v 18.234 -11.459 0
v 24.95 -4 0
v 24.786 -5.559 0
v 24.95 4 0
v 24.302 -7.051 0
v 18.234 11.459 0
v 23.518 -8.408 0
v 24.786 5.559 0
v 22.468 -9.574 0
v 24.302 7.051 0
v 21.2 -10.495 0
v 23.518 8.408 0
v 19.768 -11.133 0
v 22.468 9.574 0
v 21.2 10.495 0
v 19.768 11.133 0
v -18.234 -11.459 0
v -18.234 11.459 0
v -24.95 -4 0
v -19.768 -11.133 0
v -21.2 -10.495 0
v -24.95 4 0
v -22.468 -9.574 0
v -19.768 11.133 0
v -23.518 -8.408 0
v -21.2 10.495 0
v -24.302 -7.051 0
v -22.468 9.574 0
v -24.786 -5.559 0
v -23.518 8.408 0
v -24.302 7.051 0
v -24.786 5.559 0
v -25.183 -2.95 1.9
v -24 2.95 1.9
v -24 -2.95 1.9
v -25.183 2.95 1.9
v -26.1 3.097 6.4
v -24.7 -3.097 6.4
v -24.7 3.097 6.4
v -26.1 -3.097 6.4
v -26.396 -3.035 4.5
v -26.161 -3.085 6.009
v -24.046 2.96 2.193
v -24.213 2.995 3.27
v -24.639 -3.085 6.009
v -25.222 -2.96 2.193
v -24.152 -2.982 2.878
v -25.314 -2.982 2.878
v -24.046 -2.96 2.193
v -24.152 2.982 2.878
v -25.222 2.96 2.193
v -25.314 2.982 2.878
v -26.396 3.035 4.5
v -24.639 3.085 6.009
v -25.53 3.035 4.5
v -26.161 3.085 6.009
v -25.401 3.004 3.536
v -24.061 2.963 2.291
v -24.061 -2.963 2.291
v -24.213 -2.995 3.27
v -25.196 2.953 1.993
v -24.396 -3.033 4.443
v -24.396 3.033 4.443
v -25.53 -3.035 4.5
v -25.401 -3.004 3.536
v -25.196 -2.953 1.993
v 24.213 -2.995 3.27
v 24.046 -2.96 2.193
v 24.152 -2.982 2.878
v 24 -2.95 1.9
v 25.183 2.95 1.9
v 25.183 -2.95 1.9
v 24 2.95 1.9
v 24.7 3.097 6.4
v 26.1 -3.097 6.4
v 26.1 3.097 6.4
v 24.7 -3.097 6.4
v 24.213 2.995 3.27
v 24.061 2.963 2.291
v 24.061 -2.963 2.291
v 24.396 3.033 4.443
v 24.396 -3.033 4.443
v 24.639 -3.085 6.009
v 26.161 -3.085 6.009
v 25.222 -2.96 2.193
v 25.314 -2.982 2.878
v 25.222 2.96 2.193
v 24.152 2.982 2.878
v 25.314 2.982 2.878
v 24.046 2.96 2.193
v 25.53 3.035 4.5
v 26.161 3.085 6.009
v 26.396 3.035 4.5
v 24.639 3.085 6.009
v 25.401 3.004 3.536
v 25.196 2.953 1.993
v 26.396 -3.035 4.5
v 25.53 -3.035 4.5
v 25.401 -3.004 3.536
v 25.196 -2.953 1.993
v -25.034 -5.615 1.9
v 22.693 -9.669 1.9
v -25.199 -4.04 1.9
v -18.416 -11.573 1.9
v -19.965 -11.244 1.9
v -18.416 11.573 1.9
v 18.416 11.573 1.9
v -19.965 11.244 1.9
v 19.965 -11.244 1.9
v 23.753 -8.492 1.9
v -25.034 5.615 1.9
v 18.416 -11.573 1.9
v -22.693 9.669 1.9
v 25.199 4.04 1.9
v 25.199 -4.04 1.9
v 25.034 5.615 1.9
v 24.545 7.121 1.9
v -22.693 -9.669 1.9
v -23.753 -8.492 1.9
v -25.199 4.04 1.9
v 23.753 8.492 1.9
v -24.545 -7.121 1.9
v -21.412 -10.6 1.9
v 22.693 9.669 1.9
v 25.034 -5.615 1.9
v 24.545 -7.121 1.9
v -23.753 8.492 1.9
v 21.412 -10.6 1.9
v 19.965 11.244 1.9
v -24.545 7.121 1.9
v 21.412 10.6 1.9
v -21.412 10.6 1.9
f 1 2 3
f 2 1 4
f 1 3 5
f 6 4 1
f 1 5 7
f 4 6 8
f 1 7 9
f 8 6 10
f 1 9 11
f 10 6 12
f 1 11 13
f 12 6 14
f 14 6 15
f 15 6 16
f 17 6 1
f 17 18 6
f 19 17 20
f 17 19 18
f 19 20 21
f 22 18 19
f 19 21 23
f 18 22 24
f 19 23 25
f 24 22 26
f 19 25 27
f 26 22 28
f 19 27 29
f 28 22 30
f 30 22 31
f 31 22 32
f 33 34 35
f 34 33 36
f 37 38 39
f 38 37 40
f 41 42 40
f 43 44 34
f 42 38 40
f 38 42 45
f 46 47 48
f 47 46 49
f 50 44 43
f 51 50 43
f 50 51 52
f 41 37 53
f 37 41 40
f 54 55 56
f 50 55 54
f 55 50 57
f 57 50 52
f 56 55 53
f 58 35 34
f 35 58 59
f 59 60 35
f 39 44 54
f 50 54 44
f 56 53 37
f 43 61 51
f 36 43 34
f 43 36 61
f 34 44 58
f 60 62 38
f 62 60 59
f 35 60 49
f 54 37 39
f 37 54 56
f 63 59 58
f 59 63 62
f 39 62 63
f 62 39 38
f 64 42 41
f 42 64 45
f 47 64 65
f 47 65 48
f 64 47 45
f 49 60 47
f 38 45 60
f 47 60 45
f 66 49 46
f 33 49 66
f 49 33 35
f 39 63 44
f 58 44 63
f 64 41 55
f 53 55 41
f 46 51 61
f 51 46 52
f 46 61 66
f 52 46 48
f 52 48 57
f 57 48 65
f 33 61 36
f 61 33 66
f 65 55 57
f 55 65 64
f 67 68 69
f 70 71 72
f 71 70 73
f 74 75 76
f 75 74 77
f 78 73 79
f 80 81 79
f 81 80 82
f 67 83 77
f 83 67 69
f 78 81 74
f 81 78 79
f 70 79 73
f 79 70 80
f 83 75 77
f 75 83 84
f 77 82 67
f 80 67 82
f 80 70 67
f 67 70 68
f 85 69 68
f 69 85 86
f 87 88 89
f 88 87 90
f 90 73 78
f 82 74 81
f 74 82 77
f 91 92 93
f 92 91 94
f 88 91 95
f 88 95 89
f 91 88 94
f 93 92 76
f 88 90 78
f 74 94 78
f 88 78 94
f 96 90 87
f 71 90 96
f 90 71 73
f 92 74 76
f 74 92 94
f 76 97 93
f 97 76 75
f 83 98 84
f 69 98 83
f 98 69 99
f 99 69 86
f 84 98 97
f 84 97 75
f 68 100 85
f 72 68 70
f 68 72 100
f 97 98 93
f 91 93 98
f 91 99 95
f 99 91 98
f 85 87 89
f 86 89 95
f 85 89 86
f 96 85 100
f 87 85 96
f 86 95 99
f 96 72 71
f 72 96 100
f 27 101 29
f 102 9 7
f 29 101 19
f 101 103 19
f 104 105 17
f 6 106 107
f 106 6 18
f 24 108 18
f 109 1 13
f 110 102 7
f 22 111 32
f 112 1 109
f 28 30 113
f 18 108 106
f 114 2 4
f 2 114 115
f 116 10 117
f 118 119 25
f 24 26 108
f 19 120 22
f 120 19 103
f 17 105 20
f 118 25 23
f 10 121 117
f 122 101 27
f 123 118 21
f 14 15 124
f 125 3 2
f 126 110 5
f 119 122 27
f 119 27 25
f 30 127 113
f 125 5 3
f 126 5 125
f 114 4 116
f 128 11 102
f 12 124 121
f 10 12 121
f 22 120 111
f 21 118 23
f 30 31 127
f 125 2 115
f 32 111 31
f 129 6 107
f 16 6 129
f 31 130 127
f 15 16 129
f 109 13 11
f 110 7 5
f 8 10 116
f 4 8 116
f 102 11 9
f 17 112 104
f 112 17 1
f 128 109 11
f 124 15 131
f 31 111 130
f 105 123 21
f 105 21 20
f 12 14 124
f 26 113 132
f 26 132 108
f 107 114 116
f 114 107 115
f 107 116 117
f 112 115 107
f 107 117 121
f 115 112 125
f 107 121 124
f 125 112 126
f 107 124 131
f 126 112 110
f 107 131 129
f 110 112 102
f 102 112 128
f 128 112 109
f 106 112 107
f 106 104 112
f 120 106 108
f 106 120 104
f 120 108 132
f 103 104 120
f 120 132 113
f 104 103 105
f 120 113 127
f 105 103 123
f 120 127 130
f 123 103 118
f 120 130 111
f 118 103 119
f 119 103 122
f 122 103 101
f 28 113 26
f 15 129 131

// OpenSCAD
// PowerBook 5xx Battery backup cover
// Copyright François Revol, 2025

/* [Printing options] */

// Optimize for FDM printers (less supports, larger details) - UNIMPLEMENTED
optimize_fdm = true;

/* [Preview] */

/* [Hidden] */
$fs=0.1;


module pb5xx_battery_backup_cover(optimize_fdm=false) {
    r=7.5;
    bbox = [50.3,23.4,1.9] - (optimize_fdm?[0.4,0.4,0]:[0.45,0.3,0.6]);
    difference() {
        translate([0,0,optimize_fdm?0:0.6])
            linear_extrude(optimize_fdm?1.9:1.3, scale=[1.01,1.01]) hull()
                for(dx=[-1,1],dy=[-1,1]) {
                    translate([dx*(bbox.x/2-r),dy*(bbox.y/2-r)]) circle(r);
                }
        // text
        if (!optimize_fdm) translate([0,7.5,1.9]) difference() {
            cube([25.5,3.2,0.4], center=true);
            translate([0,0,-0.3]) linear_extrude(0.2) text("815-1537    REV.", size=2.2, halign="center", valign="center");
        }
        if (!optimize_fdm) translate([6.4,1,1.9]) difference() {
            cube([12.8,1.8,0.4], center=true);
            translate([0,0,-0.3]) linear_extrude(0.2) text("              CAV.1", size=1.2, halign="center", valign="center");
        }
    }
    /*if ($preview) color("green", 0.2) translate([0,0,0]) linear_extrude(1.9) hull() for(dx=[-1,1],dy=[-1,1]) {
        translate([dx*(50.3/2-r),dy*(23.4/2-r)]) circle(r);
    }*/
    for(dy=[-1,1])
        translate([0,dy*3.5,0]) linear_extrude(0.31, scale=[1.02,1.05]) square([48,0.6], center=true);

    // clips
    for(dx=[-1,1])
        translate([dx*25.4,0,1.9]) difference() {
            linear_extrude(4.5, scale=[0.5,1.05]) square([2.8,5.9], center=true);
            translate([dx*0.97,0,-0.1]) linear_extrude(2.7, scale=[0.7,1]) square([2.4,8], center=true);
        }
}

pb5xx_battery_backup_cover(optimize_fdm=optimize_fdm);
